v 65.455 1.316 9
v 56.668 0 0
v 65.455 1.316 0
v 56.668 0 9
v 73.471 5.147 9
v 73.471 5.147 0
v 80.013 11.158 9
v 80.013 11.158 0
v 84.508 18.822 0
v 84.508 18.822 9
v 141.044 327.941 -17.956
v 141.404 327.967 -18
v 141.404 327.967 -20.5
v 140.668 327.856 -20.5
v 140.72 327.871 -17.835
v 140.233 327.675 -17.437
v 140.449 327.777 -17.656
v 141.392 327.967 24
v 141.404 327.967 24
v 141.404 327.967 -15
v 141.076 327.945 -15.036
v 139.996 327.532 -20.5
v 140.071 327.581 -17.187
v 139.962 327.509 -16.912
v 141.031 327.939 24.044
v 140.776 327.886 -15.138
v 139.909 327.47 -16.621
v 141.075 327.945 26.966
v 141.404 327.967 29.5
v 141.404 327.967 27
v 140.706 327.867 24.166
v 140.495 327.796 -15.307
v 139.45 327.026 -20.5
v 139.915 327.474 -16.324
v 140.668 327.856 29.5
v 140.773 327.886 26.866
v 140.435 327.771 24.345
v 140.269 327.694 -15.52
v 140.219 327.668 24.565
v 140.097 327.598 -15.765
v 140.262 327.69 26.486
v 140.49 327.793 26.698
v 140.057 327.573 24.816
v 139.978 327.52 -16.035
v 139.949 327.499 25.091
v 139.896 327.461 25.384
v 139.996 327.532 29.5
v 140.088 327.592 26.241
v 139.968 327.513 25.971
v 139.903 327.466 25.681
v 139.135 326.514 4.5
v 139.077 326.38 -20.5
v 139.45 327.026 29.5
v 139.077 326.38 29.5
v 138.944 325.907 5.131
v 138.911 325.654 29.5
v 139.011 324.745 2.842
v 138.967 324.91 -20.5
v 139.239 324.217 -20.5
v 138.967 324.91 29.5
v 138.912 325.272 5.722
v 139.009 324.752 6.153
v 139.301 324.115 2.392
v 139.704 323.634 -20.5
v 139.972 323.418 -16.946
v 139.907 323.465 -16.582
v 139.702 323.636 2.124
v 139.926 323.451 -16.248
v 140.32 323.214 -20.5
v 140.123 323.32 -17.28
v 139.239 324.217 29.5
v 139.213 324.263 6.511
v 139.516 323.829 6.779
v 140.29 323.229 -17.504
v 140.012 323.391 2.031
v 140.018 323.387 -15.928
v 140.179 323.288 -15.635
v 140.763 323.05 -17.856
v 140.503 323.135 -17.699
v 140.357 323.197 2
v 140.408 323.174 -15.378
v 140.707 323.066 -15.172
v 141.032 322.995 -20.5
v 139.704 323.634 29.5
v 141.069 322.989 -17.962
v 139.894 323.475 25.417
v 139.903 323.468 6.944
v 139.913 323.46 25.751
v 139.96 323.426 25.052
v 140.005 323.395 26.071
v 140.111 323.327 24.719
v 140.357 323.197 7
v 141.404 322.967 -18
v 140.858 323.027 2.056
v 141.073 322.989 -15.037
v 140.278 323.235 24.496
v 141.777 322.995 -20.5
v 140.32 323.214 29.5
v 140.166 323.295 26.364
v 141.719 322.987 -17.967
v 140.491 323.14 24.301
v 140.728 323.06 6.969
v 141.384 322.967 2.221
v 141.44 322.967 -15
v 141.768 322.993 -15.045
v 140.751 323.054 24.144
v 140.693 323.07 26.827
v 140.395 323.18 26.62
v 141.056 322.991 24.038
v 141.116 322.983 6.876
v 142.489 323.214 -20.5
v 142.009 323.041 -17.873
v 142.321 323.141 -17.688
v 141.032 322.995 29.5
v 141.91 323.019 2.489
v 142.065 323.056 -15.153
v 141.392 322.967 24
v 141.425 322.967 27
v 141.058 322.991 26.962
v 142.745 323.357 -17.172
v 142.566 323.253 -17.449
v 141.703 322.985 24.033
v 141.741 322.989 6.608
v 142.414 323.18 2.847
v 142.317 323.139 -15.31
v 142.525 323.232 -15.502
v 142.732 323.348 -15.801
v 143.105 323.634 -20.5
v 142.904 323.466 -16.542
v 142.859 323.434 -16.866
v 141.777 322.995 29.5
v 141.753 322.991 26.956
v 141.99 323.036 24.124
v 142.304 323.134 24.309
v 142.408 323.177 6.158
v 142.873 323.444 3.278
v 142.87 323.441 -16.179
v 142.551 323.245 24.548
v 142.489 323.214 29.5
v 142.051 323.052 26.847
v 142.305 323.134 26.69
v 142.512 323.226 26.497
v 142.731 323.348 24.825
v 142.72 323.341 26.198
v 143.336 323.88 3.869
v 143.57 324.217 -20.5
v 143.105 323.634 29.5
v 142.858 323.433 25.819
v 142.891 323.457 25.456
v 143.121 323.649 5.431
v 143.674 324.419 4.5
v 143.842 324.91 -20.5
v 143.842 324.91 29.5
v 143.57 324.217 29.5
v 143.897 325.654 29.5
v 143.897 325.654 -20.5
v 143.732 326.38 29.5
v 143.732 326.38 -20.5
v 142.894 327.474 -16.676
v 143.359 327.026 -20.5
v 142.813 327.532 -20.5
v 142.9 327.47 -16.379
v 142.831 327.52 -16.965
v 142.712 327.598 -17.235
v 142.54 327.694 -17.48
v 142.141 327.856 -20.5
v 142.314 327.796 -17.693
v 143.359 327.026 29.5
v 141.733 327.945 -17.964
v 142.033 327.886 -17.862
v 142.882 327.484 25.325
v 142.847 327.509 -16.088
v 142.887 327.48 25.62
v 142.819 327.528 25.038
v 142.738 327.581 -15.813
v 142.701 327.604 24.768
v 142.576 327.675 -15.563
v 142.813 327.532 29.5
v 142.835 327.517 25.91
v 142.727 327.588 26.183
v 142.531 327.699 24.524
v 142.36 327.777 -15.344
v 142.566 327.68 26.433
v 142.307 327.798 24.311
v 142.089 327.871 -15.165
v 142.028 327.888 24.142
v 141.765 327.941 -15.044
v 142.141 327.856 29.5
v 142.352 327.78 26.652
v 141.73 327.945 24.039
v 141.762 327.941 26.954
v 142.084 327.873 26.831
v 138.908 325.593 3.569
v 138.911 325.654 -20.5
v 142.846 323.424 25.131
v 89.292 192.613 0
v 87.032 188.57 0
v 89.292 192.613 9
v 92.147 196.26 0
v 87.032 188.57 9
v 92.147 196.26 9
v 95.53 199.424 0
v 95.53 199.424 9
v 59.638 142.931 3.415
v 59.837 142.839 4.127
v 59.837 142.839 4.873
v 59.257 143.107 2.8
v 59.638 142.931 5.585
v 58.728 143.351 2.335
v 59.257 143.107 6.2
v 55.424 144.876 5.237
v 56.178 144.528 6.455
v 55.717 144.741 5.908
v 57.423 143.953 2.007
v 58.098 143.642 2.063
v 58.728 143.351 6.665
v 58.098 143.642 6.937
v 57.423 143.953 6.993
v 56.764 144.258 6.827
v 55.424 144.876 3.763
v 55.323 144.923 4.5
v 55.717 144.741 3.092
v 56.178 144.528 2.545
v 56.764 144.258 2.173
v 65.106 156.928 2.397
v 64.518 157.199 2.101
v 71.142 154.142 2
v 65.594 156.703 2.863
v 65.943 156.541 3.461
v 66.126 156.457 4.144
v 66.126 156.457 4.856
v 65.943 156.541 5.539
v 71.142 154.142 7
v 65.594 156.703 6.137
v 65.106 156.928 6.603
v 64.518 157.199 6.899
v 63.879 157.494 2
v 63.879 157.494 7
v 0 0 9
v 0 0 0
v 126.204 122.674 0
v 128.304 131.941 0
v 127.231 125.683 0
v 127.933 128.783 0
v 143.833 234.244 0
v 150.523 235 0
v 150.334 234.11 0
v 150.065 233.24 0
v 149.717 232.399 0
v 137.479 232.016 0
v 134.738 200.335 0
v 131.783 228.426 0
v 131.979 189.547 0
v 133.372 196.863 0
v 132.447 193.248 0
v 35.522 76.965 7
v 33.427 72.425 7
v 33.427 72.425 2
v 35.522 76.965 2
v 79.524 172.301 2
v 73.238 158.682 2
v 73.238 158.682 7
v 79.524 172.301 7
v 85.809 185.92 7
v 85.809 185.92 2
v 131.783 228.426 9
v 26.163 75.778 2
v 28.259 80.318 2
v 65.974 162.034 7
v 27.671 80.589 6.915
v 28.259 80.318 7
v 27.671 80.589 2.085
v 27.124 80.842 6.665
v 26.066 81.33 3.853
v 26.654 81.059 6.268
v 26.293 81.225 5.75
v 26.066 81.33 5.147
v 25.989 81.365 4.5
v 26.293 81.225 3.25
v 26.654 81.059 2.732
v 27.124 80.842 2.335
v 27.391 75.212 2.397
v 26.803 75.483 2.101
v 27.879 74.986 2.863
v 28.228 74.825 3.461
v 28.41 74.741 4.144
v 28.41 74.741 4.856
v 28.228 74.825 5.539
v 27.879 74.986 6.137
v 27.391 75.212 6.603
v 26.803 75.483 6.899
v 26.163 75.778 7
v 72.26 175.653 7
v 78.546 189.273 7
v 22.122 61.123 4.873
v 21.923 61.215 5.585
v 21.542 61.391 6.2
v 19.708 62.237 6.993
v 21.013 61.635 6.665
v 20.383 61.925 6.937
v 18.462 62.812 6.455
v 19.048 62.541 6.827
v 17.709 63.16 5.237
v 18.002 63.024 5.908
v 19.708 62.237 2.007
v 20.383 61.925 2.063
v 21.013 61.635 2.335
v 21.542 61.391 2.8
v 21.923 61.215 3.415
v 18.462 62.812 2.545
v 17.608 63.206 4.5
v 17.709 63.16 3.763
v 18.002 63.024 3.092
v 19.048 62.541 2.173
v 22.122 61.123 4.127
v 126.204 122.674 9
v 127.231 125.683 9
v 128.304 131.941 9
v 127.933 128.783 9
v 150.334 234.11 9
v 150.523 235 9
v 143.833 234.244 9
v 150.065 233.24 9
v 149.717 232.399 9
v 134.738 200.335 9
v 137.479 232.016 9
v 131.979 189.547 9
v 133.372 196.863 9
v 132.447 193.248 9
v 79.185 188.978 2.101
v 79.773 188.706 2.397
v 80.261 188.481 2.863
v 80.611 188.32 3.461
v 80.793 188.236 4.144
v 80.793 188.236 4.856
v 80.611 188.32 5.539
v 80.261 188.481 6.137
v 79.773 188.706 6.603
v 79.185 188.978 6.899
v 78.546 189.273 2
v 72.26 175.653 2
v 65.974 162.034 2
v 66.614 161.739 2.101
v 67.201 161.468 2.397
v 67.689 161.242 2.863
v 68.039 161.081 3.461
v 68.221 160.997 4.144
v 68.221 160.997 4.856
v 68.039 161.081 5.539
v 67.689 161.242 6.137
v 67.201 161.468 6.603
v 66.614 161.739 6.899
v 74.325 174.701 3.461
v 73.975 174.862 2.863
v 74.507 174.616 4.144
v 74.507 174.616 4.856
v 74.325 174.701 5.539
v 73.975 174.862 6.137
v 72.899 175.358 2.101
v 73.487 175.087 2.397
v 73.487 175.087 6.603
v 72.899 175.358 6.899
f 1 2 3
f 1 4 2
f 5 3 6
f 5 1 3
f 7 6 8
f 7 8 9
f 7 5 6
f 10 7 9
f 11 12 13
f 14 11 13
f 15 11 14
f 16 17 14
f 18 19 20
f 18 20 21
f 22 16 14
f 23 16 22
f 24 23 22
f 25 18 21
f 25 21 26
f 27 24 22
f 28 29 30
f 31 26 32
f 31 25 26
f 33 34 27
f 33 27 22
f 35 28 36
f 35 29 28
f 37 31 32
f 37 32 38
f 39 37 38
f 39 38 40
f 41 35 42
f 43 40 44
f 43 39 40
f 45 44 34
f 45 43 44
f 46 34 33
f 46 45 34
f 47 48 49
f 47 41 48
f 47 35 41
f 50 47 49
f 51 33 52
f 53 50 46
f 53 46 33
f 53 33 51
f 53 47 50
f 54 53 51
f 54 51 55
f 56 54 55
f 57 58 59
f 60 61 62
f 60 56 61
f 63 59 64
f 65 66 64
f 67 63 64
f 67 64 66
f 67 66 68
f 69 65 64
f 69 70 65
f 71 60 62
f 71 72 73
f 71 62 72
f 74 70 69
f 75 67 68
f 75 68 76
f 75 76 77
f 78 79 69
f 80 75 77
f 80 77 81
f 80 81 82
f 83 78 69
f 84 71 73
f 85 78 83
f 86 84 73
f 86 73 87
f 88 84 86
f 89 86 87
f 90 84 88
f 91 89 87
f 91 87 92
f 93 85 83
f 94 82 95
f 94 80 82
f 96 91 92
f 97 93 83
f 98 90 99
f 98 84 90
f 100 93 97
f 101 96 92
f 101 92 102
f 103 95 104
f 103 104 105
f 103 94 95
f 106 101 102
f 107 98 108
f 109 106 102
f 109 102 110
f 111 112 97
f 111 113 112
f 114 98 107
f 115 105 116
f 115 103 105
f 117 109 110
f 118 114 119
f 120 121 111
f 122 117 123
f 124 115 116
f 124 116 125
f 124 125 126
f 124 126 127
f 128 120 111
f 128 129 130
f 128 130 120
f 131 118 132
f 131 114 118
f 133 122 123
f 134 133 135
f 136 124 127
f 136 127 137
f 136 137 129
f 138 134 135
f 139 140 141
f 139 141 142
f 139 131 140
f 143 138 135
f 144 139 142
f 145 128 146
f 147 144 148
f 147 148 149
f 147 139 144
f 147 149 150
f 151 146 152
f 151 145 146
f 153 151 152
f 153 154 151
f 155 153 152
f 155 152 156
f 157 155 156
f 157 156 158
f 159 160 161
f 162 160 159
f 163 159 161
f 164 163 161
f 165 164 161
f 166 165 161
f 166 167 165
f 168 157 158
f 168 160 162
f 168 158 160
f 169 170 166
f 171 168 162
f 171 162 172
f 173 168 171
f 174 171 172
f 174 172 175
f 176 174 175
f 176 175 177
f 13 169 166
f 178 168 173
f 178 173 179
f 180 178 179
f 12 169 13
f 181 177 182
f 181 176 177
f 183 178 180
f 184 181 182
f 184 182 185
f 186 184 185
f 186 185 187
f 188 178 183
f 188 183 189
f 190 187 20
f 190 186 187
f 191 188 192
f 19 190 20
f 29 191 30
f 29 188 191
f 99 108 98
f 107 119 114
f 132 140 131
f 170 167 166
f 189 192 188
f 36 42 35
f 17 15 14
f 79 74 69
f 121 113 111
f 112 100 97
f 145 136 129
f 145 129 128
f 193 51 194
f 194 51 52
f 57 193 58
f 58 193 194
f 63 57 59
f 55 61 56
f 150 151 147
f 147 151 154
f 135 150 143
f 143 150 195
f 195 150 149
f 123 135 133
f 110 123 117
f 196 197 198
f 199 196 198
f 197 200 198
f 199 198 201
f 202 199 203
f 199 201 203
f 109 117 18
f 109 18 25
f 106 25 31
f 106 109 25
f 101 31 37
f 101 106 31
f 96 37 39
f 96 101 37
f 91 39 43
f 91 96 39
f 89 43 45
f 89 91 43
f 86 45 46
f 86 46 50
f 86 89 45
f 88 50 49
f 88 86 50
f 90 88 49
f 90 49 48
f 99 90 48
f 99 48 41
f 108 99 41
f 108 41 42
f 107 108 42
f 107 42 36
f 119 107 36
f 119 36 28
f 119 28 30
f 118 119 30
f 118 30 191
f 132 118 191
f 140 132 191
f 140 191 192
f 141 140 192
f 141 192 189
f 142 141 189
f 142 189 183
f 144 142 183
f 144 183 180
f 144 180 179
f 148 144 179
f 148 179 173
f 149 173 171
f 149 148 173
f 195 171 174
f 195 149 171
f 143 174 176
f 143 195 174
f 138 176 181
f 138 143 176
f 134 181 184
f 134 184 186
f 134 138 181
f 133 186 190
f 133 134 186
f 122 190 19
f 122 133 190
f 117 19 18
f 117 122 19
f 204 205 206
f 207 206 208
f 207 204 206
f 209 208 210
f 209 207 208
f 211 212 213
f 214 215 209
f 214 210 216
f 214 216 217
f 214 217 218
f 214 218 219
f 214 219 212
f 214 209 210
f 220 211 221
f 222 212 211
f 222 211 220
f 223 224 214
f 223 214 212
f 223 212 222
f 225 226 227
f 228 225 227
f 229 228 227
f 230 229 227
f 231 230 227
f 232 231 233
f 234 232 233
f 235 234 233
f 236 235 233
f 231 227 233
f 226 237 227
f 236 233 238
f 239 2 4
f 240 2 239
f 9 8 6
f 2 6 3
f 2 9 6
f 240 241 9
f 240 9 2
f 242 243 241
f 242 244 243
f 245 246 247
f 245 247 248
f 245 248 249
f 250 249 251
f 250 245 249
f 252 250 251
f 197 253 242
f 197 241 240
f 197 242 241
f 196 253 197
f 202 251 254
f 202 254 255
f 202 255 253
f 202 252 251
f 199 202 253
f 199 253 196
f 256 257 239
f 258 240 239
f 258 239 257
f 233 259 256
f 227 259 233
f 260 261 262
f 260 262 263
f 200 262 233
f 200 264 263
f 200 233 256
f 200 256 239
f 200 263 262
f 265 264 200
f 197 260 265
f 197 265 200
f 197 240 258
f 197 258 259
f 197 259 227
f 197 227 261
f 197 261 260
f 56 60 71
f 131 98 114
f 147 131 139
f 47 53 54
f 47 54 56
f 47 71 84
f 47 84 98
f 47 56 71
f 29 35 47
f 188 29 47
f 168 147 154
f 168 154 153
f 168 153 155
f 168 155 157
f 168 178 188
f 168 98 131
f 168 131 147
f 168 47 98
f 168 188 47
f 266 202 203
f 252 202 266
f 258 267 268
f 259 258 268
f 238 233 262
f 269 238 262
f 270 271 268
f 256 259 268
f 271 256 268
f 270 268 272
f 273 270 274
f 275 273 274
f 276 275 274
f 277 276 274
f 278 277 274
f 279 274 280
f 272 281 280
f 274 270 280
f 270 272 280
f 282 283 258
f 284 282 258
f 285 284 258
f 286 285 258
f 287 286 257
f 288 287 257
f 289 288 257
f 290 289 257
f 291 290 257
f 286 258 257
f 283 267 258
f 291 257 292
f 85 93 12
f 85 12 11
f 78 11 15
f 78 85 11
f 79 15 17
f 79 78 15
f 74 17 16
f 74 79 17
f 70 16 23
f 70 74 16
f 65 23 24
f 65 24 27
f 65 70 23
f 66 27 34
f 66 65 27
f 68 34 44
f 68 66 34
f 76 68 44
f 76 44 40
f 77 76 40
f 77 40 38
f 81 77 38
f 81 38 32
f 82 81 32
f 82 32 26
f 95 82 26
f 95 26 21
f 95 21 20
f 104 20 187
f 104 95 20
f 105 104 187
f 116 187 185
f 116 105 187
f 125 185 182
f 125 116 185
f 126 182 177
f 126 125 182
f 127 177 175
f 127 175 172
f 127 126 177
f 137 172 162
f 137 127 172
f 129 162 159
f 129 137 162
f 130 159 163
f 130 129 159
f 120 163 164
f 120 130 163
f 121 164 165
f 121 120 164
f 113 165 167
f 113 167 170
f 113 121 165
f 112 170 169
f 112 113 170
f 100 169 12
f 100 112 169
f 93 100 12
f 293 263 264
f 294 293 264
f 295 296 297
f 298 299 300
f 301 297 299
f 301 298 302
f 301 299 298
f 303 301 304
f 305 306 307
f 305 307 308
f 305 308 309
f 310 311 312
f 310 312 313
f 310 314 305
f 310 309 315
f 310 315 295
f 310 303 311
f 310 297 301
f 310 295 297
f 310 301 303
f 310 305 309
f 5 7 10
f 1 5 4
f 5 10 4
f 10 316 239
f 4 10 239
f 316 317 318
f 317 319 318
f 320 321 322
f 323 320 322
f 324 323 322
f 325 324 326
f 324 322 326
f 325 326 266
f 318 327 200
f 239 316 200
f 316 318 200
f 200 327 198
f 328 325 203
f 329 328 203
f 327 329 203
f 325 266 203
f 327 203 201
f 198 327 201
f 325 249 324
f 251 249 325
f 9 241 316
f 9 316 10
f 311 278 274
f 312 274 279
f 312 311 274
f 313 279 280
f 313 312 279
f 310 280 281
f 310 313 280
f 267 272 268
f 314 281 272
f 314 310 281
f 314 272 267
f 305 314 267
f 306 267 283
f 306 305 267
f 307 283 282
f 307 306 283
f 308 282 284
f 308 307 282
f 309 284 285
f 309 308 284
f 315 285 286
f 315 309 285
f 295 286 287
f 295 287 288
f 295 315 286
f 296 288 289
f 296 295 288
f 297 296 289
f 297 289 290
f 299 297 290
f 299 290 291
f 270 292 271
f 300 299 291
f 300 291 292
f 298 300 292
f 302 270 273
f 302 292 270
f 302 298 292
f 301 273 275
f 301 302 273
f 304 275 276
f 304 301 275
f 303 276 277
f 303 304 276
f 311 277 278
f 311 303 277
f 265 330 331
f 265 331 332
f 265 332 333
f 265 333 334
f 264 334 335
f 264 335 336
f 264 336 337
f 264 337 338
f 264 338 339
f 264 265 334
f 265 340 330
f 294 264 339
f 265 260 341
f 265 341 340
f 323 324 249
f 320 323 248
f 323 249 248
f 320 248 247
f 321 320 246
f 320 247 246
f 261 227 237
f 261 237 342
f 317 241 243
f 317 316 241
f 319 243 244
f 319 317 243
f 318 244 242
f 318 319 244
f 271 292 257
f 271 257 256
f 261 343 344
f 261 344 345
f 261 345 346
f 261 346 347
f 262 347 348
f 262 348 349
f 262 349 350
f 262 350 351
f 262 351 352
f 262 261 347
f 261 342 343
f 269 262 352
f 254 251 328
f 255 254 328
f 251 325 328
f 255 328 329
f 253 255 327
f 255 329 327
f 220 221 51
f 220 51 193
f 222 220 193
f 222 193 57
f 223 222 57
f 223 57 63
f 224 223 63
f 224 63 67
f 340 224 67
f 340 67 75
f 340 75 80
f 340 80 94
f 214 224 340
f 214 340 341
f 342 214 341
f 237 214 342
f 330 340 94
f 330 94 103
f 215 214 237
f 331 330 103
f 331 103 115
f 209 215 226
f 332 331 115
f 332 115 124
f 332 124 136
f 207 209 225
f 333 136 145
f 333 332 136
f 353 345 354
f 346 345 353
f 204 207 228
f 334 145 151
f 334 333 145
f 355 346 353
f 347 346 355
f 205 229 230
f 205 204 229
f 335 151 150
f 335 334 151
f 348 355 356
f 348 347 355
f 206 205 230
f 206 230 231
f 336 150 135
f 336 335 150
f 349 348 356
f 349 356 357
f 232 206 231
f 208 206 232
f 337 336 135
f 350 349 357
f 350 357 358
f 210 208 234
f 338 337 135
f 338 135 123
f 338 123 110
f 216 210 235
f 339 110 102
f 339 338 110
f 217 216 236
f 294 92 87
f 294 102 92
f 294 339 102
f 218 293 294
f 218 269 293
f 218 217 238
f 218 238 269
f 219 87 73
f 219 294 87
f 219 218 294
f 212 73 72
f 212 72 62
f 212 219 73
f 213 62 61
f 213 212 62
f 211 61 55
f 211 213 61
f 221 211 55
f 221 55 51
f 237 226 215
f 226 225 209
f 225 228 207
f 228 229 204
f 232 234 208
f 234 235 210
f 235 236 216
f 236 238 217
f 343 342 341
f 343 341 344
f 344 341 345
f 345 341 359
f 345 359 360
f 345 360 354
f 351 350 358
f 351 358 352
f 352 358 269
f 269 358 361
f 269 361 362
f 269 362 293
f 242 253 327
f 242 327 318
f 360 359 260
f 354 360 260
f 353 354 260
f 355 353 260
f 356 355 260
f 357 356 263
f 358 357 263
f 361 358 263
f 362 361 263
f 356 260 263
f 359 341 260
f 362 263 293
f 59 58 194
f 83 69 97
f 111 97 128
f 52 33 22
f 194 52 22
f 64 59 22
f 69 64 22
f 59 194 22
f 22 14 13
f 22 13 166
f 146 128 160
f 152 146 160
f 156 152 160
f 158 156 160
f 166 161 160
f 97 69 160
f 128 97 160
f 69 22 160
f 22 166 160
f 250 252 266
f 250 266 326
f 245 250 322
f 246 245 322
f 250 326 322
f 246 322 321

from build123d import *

# Parameters (mm, degrees)
BOSS_EXTRU_1_DEPTH           = 9
ESQUISSE36_W                 = 5
ESQUISSE36_H                 = 5
ESQUISSE36_H_2               = 15
BOSS_EXTRU_4_DEPTH           = 8
BALAYAGE2_PROFILE_R          = 2.5
BALAYAGE3_PROFILE_R          = 2.5
CONG_2_R                     = 30
CONG_3_R                     = 10
BALAYAGE4_PROFILE_R          = 2.5
ENL_V_MAT_EXTRU_2_DEPTH      = 363.063201398
ENL_V_MAT_EXTRU_2_DEPTH_BACK = 10
ESQUISSE103_R                = 1.5


with BuildPart() as part:
    # Esquisse1 → Boss.-Extru.1 (new body)
    with BuildSketch(Plane.XY):
        Polygon((0, 0), (90, 195), (140, 235), (150.932632942, 235), (132.339381175, 195.201149163), (127.997155304, 127.139031538), (76.950468366, 0), align=None)
    extrude(amount=BOSS_EXTRU_1_DEPTH)

    # Esquisse36 → Boss.-Extru.4 (add)
    with BuildSketch(Plane(origin=(0, 0, 0), x_dir=(0, 0, 1), z_dir=(-0.9079593845004518, 0.4190581774617469, 0))):
        with Locations((4.5, 172.267315949)):
            Rectangle(ESQUISSE36_W, ESQUISSE36_H)
        with Locations((4.5, 82.267315949)):
            Rectangle(ESQUISSE36_W, ESQUISSE36_H)
        with Locations((4.5, 197.267315949)):
            Rectangle(ESQUISSE36_W, ESQUISSE36_H_2)
    extrude(amount=BOSS_EXTRU_4_DEPTH)

    # Balayage2: sweep along a path in Esquisse37
    with BuildLine(Plane(origin=(-7.263675076, 3.35246542, 0), x_dir=(0, 0, 1), z_dir=(-0.9079593845004523, 0.4190581774617459, 0))) as balayage2_path:
        Line((4.5, 354.767315949), (4.5, 154.767315949))
    # Balayage2 profile (on start of the path) → Balayage2 (sweep)
    with BuildSketch(Plane(origin=(141.404469769, 325.46677925, 4.5), x_dir=(-0.9079593845004521, 0.41905817746174584, 0), z_dir=(-0.4190581774617459, -0.9079593845004523, 0))):
        Circle(BALAYAGE2_PROFILE_R)
    sweep(path=balayage2_path.line)

    # Balayage3: sweep along a path in Esquisse50
    with BuildLine(Plane(origin=(-7.263675076, 3.35246542, 0), x_dir=(0, 0, 1), z_dir=(-0.9079593845004512, 0.41905817746174806, 0))) as balayage3_path:
        Line((4.5, 84.767315949), (4.5, 64.767315949))
    # Balayage3 profile (on start of the path) → Balayage3 (sweep)
    with BuildSketch(Plane(origin=(28.258761854, 80.317745435, 4.5), x_dir=(-0.9079593845004512, 0.41905817746174806, 0), z_dir=(-0.41905817746174806, -0.9079593845004512, 0))):
        Circle(BALAYAGE3_PROFILE_R)
    sweep(path=balayage3_path.line)

    # Congé2
    cong_2_edges = [part.edges().sort_by_distance(p)[0] for p in [
        (90, 195, 4.5),
        (140, 235, 4.5),
        (132.339381175, 195.201149163, 4.5),
        (127.997155304, 127.139031538, 4.5),
        (76.950468366, 0, 4.5),
    ]]
    fillet(cong_2_edges, radius=CONG_2_R)

    # Congé3
    # the kernel refuses this fillet: 10 mm, written as the material it takes off along each edge
    with BuildSketch(Plane(origin=(150.932632942, 235, -7.177129448), x_dir=(-1, 0, 0), z_dir=(0, 0, 1))) as cong_3_piece_1:
        with BuildLine():
            CenterArc((10.275185308, -1.631673015), CONG_3_R, 154.958930111, 15.650284086)
            Line((1.215139114, 2.601004974), (0, 0))
            Line((0, 0), (0.409201162, 0))
        make_face()
    extrude(amount=23.354258897, mode=Mode.SUBTRACT)

    # Balayage4: sweep along a path in Esquisse88
    with BuildLine(Plane(origin=(148.668144845, 322.11431383, 0), x_dir=(0.907959384500452, -0.4190581774617463, 0), z_dir=(0.41905817746174623, 0.9079593845004519, 0))) as balayage4_path:
        Line((-8, 20.5), (-8, -29.5))
    # Balayage4 profile (on start of the path) → Balayage4 (sweep)
    with BuildSketch(Plane(origin=(141.404469769, 325.46677925, -20.5), x_dir=(0, 1, 0), z_dir=(0, 0, 1))):
        Circle(BALAYAGE4_PROFILE_R)
    sweep(path=balayage4_path.line)

    # Esquisse103 → Enlèv. mat.-Extru.2 (cut, two sides: drawn at the far end of the back side and taken through both)
    with BuildSketch(Plane(origin=(0, 0, 0), x_dir=(1, 0, 0), z_dir=(0, 1, 0)).offset(-ENL_V_MAT_EXTRU_2_DEPTH_BACK)):
        with Locations(Location((141.404469769, 16.5, 0), (0, 0, 90))):
            Circle(ESQUISSE103_R)
        with Locations(Location((141.391933609, -25.5, 0), (0, 0, 90))):
            Circle(ESQUISSE103_R)
    extrude(amount=ENL_V_MAT_EXTRU_2_DEPTH + ENL_V_MAT_EXTRU_2_DEPTH_BACK, mode=Mode.SUBTRACT)


solid = part.part
